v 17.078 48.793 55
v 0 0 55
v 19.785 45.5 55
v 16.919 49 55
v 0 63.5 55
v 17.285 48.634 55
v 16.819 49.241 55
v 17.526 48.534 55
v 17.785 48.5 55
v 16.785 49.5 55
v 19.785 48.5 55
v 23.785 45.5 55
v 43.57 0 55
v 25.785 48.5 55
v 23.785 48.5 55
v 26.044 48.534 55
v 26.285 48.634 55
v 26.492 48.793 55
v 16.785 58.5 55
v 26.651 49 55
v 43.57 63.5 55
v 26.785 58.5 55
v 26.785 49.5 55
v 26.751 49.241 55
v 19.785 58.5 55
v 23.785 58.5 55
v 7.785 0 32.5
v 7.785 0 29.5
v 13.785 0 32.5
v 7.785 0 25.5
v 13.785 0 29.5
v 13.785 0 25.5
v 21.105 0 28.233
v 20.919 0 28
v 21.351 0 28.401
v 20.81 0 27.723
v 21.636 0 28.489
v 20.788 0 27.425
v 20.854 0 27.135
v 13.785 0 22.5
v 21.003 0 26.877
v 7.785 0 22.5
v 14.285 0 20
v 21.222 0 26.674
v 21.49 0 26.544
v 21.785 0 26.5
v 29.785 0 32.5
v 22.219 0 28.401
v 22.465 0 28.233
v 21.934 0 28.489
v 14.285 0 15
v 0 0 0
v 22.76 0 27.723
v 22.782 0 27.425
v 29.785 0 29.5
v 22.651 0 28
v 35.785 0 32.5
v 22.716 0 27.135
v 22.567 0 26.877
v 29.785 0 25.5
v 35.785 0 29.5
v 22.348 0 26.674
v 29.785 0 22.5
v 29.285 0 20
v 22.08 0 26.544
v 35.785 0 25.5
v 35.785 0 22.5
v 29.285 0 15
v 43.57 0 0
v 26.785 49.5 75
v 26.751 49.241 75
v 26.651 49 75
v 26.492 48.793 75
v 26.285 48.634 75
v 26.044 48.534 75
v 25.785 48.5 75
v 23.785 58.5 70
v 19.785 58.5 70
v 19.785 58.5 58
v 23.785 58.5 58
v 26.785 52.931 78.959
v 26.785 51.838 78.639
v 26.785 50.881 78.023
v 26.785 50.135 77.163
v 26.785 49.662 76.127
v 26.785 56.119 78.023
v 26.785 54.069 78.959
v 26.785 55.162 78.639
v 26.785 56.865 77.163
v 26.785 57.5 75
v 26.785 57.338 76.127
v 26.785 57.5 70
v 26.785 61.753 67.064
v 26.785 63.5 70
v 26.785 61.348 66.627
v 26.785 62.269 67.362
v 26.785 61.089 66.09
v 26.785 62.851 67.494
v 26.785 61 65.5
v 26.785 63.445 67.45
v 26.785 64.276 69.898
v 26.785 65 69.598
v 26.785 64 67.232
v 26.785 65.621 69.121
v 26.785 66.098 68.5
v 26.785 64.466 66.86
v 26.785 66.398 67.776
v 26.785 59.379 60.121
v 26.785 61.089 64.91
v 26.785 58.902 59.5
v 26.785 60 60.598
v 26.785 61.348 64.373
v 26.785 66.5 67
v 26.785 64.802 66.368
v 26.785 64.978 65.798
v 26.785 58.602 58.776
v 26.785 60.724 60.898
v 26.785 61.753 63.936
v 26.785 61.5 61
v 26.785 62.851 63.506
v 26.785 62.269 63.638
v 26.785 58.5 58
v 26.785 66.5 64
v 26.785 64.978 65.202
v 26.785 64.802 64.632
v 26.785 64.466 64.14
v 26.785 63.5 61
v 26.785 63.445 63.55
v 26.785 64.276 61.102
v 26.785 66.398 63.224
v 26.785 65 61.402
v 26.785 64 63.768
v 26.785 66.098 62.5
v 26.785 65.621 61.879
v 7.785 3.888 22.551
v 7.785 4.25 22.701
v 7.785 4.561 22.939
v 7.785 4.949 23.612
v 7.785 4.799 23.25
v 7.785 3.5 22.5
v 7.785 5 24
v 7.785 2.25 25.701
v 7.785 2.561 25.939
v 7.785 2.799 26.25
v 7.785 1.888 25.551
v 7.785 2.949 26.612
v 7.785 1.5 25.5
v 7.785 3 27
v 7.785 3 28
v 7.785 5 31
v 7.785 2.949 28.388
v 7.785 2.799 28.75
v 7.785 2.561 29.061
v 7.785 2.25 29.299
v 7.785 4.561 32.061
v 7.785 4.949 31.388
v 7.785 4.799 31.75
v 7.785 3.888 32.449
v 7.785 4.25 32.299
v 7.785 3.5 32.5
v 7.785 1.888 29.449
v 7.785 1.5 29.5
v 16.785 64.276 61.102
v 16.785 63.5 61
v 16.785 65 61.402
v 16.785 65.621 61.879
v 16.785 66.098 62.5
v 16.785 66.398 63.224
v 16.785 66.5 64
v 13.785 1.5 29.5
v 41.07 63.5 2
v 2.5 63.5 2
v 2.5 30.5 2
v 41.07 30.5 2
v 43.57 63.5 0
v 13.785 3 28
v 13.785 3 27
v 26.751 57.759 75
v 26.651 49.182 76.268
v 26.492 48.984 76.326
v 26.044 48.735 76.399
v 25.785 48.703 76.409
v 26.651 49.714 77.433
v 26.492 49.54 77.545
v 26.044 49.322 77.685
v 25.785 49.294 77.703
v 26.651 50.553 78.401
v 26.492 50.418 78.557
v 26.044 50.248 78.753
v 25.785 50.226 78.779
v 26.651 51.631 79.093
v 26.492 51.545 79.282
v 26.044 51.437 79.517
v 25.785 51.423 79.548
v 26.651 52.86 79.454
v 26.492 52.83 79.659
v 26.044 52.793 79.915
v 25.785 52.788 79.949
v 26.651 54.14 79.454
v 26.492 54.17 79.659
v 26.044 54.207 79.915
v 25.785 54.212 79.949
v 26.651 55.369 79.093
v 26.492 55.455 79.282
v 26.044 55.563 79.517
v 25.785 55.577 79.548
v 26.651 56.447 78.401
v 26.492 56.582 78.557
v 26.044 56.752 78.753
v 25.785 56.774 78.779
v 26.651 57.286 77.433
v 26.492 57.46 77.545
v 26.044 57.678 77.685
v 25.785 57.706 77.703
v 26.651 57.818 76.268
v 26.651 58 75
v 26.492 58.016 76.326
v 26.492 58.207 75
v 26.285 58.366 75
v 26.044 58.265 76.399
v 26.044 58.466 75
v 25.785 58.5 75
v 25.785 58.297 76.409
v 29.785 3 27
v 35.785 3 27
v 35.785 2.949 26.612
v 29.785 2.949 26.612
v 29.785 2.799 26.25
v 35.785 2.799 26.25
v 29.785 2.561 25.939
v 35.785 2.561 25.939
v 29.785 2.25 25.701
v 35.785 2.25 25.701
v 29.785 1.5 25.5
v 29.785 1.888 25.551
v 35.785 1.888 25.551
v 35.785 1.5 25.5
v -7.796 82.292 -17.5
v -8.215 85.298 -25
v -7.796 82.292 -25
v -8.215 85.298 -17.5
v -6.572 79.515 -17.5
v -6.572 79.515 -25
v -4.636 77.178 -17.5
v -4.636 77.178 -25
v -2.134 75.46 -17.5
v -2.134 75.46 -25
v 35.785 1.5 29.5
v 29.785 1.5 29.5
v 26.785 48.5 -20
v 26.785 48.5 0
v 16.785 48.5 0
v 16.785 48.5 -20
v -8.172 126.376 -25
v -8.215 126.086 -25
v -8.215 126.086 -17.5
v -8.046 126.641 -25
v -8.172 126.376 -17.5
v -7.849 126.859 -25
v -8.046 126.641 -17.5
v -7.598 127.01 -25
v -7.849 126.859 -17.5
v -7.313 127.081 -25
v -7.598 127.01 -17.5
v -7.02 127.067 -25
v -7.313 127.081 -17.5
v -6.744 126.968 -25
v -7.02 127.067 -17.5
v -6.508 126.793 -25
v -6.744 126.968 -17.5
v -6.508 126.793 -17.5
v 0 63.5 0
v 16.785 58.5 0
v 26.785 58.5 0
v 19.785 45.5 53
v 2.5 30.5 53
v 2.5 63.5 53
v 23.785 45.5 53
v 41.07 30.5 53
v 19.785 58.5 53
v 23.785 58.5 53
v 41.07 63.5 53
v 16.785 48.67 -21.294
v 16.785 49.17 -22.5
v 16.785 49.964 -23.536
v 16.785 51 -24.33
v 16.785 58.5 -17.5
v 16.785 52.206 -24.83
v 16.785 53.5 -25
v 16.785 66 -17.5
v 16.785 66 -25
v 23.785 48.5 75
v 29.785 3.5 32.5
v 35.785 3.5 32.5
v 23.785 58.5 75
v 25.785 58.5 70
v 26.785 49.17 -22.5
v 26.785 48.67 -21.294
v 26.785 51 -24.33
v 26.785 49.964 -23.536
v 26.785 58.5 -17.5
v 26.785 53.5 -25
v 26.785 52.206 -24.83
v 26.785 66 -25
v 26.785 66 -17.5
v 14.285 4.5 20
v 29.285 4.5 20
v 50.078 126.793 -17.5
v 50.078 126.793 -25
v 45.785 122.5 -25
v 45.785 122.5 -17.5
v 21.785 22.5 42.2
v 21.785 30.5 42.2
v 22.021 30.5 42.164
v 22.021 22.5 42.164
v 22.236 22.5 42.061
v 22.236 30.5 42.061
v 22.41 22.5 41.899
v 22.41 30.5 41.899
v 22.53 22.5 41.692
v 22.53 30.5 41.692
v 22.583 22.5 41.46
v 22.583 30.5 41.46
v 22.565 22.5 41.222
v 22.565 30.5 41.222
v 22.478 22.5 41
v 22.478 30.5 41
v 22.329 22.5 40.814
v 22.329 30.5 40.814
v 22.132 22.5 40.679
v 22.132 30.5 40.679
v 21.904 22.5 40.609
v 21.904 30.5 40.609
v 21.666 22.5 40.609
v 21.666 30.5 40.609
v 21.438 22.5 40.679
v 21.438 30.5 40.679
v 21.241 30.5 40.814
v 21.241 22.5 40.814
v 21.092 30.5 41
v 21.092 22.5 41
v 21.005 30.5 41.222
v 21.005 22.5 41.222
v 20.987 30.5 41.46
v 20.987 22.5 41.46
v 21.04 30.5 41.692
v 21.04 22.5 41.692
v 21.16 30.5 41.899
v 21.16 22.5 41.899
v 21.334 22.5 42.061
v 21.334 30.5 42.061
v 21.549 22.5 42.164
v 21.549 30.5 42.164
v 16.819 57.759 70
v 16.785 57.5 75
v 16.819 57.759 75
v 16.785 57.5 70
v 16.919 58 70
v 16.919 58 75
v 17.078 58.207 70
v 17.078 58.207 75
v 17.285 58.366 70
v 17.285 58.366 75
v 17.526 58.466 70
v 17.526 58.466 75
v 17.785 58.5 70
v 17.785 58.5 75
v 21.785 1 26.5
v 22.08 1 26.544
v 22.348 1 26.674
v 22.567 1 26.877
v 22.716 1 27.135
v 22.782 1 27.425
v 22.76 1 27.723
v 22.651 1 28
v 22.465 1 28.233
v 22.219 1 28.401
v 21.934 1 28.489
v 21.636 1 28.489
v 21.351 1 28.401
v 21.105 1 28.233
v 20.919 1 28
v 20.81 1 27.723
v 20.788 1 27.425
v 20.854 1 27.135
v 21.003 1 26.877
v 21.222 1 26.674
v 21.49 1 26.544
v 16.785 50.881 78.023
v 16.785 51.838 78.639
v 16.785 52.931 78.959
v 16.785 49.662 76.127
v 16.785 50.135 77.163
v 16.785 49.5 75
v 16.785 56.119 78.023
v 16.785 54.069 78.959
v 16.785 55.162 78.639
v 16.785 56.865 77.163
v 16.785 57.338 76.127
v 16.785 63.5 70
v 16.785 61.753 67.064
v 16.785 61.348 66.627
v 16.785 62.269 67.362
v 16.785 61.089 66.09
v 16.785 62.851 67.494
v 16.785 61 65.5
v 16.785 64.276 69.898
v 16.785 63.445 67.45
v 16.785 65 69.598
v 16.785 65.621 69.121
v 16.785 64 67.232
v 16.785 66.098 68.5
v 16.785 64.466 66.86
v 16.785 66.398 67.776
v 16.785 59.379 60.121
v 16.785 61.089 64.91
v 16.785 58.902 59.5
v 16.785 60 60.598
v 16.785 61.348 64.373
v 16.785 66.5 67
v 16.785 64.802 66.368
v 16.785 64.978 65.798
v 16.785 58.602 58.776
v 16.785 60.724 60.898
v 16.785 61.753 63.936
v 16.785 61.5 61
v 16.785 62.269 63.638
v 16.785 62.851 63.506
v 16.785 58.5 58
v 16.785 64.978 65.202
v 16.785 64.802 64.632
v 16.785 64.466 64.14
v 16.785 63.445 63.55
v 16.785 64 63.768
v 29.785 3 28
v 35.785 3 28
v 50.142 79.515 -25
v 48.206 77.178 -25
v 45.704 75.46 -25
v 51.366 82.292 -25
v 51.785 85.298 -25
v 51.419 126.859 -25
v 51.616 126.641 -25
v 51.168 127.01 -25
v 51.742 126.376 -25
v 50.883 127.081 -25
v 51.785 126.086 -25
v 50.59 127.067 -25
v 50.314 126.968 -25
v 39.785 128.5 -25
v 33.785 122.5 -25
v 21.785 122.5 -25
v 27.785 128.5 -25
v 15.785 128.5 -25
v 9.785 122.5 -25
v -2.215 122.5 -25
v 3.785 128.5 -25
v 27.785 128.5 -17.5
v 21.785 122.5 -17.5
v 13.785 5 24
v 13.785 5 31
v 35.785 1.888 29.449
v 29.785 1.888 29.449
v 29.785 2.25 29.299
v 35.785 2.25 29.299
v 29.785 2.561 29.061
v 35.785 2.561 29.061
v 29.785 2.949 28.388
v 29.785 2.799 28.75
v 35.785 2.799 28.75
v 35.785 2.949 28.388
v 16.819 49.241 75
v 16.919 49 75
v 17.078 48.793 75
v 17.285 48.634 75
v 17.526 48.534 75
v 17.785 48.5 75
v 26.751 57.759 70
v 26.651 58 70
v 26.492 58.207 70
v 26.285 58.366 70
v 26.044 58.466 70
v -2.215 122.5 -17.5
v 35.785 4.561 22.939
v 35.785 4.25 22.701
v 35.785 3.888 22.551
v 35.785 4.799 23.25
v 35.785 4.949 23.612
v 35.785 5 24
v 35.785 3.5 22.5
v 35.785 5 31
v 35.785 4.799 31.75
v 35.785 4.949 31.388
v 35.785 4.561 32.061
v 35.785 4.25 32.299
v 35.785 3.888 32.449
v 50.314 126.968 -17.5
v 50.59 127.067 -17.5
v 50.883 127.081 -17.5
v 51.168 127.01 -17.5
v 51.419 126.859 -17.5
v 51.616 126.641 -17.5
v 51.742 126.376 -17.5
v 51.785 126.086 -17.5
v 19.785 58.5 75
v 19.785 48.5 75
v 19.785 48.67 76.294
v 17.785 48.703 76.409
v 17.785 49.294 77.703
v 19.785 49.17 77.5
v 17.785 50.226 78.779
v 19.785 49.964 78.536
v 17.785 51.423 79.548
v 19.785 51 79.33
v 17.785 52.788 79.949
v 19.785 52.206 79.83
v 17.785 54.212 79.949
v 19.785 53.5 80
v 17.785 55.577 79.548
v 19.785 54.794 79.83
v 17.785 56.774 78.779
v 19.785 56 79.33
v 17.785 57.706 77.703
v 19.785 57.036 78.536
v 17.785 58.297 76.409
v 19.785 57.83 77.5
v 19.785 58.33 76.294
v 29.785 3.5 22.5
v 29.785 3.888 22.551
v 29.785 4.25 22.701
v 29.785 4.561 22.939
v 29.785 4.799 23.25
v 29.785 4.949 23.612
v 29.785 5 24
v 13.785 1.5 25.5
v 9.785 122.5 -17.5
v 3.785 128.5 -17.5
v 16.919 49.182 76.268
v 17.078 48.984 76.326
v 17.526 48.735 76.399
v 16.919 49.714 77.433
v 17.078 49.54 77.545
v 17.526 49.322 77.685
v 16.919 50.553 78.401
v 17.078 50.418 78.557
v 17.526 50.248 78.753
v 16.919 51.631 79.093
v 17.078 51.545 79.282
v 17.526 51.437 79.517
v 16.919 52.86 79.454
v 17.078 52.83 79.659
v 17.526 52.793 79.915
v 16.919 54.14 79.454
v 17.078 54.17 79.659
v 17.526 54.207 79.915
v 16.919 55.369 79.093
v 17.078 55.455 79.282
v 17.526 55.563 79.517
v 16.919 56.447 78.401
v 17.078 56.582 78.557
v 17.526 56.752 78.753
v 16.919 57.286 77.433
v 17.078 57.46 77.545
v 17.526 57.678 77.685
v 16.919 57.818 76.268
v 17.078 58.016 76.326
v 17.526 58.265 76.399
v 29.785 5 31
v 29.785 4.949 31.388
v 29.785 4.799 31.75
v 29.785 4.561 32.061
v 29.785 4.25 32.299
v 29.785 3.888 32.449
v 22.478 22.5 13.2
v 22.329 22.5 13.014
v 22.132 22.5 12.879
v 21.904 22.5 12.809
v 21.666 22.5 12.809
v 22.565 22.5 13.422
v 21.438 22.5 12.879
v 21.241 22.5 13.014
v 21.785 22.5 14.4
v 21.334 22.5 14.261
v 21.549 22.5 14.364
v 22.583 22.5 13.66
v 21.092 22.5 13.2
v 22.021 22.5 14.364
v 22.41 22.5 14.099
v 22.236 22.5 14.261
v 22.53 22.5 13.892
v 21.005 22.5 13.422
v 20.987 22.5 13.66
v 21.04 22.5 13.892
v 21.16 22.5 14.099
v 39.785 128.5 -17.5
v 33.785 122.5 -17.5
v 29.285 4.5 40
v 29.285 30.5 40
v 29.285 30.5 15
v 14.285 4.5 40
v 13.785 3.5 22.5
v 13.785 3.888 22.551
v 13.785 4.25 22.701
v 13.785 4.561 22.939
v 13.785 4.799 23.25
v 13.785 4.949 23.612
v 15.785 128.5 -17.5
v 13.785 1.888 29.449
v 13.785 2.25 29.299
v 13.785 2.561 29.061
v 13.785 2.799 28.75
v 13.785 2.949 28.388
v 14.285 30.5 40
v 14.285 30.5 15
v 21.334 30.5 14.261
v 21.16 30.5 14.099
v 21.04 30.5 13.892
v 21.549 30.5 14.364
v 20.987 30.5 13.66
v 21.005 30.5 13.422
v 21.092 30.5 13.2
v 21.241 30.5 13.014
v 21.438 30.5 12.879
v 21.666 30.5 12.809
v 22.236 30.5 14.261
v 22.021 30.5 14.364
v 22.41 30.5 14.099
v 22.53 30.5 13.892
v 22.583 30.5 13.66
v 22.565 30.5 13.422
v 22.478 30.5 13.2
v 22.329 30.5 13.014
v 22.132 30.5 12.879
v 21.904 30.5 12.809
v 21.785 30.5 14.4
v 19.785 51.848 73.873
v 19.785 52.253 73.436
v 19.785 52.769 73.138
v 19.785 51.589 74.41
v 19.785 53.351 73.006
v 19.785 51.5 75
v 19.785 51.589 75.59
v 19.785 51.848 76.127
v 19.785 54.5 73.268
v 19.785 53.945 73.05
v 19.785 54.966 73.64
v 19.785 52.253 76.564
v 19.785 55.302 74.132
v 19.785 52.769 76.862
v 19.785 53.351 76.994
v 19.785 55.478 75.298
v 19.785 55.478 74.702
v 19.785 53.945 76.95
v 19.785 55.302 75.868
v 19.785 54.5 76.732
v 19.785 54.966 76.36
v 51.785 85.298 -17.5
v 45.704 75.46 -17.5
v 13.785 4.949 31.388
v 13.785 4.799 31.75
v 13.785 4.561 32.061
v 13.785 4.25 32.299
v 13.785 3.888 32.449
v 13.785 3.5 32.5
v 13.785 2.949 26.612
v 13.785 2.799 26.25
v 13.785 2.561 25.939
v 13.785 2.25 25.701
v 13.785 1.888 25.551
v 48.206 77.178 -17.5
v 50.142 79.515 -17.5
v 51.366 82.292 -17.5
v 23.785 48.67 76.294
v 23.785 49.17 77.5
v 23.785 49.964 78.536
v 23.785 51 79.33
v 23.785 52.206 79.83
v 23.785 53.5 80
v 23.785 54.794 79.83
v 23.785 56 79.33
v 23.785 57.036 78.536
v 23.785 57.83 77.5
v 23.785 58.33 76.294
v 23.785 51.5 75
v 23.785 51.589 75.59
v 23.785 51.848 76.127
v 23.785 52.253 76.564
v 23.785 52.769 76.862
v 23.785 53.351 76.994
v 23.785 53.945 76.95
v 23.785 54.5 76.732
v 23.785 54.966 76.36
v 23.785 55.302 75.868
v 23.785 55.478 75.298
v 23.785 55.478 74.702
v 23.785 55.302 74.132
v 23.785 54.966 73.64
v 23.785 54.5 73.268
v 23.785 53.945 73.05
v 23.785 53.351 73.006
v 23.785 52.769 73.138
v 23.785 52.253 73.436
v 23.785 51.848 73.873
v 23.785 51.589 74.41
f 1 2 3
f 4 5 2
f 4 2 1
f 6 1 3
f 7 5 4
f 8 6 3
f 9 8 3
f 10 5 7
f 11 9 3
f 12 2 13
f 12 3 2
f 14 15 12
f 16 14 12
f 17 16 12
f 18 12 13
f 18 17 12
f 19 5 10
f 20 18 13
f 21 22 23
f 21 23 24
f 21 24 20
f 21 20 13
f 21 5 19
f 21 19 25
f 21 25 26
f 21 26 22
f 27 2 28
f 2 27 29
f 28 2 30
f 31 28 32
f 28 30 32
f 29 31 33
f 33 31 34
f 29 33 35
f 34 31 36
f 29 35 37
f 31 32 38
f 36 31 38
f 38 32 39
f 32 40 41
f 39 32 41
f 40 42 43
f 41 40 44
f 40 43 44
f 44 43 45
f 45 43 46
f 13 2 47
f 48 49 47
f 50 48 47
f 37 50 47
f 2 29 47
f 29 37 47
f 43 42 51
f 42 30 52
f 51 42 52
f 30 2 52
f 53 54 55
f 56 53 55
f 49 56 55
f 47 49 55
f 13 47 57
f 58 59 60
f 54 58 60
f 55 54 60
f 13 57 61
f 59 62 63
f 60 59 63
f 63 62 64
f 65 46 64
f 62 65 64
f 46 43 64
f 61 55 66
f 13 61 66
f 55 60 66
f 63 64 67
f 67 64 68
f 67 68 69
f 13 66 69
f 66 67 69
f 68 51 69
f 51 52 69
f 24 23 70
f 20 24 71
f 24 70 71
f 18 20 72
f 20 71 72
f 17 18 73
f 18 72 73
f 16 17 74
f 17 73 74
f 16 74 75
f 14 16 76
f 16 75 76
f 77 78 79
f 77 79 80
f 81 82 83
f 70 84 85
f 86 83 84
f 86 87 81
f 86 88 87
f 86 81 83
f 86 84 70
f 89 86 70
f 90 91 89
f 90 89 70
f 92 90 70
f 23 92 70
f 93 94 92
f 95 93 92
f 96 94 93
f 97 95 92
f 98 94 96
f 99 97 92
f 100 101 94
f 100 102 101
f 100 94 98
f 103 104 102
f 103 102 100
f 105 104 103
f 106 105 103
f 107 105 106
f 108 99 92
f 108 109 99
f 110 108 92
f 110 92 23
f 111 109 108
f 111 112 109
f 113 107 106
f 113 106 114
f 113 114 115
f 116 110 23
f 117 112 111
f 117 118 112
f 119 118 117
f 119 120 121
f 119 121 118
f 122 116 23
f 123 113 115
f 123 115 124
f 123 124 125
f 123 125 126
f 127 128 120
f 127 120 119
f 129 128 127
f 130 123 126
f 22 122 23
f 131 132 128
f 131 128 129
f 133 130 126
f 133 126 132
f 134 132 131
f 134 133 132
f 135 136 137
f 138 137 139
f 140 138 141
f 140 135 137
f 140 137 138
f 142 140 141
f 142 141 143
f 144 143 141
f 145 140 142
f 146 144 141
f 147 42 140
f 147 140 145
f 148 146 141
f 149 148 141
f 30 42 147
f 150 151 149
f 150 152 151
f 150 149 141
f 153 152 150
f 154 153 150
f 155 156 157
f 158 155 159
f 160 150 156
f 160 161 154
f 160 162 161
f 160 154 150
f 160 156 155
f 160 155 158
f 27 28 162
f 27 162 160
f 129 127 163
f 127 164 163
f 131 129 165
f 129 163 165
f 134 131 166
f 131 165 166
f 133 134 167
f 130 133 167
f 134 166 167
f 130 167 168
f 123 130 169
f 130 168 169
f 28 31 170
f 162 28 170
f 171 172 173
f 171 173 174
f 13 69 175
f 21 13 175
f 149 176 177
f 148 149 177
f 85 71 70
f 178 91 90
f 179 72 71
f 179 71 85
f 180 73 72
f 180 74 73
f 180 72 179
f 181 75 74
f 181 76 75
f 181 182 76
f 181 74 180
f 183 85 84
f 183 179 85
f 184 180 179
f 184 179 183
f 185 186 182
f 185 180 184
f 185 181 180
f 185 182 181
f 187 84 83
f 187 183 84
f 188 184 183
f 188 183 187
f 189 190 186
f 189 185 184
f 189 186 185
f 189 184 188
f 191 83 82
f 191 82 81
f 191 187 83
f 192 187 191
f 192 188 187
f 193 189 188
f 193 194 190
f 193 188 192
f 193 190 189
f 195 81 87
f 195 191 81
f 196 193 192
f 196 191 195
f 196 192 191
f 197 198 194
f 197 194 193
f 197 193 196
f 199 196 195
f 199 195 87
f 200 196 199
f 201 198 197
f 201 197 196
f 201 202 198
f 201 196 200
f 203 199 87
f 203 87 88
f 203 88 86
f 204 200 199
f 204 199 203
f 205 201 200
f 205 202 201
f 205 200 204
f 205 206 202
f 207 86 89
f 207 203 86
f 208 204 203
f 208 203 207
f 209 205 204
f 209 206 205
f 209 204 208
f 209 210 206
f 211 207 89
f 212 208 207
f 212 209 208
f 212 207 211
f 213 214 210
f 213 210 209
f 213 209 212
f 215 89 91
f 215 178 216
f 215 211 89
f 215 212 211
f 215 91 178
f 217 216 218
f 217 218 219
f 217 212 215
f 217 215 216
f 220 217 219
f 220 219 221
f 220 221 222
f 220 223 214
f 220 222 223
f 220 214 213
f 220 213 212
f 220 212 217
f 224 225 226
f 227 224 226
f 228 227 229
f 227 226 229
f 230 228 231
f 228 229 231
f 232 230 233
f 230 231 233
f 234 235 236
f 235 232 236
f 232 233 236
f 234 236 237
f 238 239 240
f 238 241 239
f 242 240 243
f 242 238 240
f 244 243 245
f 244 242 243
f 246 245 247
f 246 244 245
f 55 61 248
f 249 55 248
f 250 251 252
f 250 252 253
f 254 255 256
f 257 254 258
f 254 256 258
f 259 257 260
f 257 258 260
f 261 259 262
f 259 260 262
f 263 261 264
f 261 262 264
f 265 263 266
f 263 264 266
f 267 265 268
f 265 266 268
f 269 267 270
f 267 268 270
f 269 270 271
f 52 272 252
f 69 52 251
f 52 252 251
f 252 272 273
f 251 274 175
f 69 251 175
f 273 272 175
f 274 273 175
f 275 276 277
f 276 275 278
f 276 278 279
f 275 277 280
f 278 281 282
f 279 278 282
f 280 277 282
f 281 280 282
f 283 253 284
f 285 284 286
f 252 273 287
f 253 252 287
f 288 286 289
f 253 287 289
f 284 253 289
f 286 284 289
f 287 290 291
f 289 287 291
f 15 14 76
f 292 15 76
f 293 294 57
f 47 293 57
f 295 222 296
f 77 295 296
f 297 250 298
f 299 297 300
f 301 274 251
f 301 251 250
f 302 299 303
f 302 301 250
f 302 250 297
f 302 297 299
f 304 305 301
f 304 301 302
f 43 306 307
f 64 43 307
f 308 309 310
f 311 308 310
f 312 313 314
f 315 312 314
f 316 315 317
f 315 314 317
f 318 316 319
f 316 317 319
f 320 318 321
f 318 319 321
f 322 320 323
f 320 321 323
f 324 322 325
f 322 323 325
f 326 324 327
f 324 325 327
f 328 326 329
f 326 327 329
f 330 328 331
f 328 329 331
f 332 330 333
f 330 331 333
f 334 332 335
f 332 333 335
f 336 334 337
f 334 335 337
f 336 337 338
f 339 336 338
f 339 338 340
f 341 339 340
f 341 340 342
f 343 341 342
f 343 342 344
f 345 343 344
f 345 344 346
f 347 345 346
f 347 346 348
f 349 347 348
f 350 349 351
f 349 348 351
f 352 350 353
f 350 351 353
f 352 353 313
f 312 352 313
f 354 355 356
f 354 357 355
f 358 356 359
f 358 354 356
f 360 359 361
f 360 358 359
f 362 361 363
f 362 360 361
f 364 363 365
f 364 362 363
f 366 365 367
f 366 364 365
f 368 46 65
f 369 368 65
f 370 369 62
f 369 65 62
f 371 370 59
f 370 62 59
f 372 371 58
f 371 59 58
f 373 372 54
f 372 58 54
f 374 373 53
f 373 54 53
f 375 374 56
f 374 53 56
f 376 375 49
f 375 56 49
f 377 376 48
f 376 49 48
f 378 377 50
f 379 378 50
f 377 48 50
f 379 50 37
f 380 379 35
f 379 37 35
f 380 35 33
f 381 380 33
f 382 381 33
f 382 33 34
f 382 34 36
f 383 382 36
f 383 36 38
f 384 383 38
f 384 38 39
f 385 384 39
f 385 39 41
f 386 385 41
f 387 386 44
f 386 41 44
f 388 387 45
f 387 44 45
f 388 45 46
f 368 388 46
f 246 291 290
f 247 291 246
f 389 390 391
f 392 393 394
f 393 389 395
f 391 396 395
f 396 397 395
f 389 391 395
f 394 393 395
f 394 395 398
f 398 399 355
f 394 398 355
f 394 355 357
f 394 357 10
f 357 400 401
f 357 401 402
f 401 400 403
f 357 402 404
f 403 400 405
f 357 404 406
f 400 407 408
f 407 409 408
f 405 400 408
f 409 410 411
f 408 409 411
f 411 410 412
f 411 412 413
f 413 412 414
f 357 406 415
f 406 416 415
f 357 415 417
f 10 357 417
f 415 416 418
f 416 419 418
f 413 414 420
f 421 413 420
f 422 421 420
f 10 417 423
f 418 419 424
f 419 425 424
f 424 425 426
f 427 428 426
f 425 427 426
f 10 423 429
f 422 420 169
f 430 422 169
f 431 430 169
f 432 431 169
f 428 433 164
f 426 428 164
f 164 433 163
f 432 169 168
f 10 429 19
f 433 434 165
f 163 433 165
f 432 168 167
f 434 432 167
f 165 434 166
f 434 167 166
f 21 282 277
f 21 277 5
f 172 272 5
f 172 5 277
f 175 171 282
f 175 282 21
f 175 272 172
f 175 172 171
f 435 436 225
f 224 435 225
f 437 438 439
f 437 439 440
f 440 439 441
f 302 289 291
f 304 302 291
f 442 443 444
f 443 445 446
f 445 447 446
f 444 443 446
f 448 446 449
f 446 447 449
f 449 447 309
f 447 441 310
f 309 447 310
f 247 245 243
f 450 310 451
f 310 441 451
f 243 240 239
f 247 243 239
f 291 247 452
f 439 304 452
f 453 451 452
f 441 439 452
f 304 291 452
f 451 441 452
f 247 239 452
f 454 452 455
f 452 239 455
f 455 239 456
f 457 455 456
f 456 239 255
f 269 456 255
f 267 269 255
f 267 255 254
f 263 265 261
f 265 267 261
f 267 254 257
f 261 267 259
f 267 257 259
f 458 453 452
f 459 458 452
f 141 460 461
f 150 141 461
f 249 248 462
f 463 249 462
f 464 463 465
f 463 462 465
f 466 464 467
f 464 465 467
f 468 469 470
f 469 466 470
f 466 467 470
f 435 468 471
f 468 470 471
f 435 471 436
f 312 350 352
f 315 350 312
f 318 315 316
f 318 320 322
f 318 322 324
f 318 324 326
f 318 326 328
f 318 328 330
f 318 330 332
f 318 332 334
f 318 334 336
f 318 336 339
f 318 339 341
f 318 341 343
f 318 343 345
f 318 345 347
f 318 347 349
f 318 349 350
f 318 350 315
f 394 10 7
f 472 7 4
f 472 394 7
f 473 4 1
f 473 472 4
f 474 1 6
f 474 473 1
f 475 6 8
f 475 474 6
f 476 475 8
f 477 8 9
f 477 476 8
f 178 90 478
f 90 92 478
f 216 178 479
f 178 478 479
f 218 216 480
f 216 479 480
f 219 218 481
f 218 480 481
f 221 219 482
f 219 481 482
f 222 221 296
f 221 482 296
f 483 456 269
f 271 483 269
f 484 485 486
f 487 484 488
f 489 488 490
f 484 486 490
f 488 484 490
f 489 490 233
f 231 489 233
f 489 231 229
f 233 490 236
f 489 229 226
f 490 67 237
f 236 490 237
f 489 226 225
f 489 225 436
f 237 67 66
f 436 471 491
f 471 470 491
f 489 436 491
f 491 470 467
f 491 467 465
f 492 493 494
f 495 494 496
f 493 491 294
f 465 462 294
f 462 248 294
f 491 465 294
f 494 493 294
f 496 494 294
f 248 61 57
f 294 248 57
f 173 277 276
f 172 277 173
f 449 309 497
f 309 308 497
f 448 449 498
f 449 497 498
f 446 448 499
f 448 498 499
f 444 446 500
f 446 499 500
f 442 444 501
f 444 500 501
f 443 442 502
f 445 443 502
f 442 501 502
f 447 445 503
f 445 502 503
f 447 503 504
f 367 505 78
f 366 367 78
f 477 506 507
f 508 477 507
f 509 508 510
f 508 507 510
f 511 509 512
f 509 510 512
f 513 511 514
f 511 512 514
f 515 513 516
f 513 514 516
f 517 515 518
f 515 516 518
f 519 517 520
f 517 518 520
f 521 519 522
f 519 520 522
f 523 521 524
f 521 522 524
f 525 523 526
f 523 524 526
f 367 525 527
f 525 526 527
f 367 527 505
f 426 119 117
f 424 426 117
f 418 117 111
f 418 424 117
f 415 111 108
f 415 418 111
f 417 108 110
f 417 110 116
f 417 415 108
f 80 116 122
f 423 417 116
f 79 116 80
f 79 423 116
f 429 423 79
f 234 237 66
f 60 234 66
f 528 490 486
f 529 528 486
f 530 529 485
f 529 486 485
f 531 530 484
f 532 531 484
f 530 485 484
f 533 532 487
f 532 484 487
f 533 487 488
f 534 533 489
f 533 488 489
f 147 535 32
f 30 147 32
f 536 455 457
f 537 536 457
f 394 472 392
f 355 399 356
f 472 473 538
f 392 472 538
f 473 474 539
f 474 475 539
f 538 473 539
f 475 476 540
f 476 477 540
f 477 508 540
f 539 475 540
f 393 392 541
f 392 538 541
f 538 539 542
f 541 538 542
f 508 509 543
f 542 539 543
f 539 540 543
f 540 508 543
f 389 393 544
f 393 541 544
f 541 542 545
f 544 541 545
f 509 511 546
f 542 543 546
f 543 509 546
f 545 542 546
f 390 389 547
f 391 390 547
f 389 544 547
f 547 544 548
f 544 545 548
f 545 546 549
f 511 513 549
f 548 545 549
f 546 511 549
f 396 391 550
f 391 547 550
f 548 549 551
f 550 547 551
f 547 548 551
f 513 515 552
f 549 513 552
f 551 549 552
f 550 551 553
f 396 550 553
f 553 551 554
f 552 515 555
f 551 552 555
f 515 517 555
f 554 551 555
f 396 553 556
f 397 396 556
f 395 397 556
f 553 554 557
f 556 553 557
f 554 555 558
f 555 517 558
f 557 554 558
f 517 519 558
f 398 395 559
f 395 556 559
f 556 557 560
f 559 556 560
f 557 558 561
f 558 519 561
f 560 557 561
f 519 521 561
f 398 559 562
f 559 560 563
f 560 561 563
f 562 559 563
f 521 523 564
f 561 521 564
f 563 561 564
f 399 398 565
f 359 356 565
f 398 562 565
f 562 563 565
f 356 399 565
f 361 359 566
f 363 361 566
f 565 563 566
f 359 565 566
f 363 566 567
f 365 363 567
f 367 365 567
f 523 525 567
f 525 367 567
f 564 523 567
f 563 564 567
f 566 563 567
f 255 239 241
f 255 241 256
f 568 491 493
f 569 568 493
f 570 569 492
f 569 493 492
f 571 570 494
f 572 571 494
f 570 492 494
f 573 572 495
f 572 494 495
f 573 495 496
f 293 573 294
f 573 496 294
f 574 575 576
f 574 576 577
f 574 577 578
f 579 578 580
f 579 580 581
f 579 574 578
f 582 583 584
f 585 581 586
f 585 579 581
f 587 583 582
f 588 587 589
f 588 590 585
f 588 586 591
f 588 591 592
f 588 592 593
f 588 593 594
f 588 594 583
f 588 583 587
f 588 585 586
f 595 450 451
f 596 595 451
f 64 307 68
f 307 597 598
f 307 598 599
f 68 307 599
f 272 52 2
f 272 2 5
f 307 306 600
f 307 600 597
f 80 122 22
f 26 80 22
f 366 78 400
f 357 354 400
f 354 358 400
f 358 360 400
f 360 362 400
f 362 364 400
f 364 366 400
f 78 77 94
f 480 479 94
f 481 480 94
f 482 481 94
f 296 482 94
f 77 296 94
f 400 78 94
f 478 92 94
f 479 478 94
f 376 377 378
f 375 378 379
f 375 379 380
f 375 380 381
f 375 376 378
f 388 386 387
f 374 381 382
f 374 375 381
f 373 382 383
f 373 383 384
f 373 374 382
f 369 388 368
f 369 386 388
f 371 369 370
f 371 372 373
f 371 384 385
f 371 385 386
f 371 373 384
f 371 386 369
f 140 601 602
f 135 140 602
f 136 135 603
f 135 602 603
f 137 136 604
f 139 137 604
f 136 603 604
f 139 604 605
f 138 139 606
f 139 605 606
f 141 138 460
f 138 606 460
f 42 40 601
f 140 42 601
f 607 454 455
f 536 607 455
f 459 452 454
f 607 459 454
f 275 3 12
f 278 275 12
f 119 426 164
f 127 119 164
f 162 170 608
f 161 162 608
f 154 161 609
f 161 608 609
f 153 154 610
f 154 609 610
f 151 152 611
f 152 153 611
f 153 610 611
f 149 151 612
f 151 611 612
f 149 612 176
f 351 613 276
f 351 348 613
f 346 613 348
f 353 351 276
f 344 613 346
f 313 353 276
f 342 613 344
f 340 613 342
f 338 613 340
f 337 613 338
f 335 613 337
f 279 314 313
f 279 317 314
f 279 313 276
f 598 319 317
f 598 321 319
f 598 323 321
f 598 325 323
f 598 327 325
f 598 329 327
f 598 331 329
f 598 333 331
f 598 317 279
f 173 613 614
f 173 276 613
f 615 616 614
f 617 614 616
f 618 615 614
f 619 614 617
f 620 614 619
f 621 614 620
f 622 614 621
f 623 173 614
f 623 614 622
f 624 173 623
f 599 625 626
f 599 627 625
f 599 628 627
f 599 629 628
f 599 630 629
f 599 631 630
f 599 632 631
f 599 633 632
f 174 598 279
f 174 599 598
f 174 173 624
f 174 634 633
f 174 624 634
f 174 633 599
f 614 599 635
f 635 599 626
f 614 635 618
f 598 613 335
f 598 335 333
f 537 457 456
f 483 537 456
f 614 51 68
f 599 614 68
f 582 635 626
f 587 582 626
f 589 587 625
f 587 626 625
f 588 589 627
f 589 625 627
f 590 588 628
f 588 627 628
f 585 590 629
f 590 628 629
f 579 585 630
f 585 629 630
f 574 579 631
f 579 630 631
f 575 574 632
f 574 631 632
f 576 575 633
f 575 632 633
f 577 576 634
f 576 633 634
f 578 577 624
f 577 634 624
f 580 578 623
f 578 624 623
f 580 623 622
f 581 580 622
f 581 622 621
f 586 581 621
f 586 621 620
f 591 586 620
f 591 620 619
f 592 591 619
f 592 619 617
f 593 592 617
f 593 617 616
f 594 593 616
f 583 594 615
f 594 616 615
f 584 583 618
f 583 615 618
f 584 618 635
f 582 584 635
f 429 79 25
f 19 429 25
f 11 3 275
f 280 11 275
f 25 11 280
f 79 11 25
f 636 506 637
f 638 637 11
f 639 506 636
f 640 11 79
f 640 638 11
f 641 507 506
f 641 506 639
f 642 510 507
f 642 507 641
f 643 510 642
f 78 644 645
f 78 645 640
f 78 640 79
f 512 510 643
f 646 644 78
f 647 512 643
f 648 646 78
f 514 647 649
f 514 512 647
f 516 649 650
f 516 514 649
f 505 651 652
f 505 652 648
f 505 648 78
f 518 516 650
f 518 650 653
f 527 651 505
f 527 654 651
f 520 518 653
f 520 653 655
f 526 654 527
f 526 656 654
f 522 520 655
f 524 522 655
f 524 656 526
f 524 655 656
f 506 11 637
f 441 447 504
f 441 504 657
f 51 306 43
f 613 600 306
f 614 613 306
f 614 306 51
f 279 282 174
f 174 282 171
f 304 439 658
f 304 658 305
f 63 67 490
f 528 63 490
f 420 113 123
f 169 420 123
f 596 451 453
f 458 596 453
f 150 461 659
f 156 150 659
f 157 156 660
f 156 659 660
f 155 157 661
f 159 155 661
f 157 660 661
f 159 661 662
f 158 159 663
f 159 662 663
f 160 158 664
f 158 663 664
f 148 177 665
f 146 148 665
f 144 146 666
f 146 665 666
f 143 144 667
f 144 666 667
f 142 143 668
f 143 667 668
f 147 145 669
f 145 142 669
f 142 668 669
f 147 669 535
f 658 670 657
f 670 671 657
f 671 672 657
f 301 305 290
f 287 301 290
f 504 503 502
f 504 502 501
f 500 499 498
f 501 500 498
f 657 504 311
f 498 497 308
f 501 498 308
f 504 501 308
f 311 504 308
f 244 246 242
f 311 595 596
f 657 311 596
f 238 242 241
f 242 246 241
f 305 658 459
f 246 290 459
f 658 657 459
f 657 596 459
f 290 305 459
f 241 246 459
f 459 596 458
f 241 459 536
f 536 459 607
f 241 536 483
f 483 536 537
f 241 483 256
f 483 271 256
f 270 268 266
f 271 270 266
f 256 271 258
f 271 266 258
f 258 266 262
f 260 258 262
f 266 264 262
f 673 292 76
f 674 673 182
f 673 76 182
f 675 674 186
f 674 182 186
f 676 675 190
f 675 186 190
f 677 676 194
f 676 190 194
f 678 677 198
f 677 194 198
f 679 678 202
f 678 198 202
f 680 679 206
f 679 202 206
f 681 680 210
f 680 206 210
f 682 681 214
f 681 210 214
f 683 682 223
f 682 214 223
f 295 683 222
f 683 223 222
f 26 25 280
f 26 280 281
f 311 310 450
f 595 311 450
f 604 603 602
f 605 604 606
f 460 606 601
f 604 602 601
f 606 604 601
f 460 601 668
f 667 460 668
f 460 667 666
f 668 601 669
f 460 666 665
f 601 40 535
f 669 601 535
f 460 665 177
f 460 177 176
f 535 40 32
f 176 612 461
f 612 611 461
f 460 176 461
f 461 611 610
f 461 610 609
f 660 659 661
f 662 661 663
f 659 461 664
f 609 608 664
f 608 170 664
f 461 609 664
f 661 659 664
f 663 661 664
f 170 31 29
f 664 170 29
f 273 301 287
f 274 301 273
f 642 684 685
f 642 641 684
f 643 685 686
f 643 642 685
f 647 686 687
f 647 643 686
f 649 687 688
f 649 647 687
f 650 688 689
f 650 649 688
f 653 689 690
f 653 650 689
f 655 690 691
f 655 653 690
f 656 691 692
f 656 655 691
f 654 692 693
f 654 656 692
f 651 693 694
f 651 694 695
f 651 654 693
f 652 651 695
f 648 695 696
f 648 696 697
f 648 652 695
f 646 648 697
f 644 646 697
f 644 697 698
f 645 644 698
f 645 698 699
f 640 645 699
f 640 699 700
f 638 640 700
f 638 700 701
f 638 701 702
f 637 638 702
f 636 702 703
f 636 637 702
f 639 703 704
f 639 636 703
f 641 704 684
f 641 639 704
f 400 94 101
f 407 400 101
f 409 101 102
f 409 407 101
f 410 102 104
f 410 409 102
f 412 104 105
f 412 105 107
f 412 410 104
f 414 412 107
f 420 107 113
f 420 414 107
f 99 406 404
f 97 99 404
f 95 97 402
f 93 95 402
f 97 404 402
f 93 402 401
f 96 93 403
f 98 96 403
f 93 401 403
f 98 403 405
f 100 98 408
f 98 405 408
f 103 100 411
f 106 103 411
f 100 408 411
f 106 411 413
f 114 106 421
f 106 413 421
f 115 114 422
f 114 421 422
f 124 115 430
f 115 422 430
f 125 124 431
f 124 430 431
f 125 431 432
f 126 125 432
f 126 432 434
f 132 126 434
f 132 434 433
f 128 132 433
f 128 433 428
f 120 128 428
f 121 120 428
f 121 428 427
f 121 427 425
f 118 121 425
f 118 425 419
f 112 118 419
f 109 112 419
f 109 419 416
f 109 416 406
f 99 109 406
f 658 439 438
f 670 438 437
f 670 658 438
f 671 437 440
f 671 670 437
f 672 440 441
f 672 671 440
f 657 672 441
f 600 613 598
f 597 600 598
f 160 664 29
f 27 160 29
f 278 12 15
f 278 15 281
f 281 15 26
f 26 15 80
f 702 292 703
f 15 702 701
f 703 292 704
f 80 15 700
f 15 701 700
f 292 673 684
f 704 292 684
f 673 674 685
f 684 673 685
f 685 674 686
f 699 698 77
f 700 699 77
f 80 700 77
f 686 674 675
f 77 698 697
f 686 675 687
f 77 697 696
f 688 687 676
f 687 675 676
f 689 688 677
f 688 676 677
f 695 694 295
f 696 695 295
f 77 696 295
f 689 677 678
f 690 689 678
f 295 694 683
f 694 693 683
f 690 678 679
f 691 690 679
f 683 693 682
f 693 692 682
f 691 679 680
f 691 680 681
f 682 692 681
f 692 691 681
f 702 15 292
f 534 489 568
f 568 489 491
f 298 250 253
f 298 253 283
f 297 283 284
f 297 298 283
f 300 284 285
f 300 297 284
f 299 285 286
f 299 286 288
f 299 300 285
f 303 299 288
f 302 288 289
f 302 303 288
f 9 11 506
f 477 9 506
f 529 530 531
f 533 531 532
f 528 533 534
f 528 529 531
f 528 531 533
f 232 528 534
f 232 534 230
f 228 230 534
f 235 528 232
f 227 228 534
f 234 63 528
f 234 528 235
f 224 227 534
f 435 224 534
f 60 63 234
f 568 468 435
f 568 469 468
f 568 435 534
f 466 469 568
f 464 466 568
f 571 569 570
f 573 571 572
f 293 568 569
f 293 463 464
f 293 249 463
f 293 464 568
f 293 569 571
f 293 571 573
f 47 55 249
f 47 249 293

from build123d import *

# Parameters (mm, degrees)
SKETCH1_W           = 43.57
SKETCH1_H           = 63.5
BOSS_EXTRUDE1_DEPTH = 55
CUT_EXTRUDE2_DEPTH  = 95.634004988
SKETCH4_W           = 43.57
SKETCH4_H           = 55
SKETCH4_W_2         = 6
SKETCH4_H_2         = 15
BOSS_EXTRUDE2_DEPTH = 9
SKETCH5_R           = 1
CUT_EXTRUDE3_DEPTH  = 1
BOSS_EXTRUDE3_START = -26.785
BOSS_EXTRUDE3_DEPTH = 10
SKETCH7_R           = 2
CUT_EXTRUDE4_DEPTH  = 2
SKETCH13_W          = 9
SKETCH13_H          = 8
BOSS_EXTRUDE6_DEPTH = 10
FILLET12_R          = 3
FILLET2_R           = 1
BOSS_EXTRUDE4_DEPTH = 10
BOSS_EXTRUDE5_DEPTH = 7.5
CUT_EXTRUDE11_DEPTH = 174.835946297
LPATTERN1_COUNT     = 5
LPATTERN1_PITCH     = 12
FILLET9_R           = 1
FILLET11_R          = 11
SKETCH14_R          = 2
CUT_EXTRUDE12_DEPTH = 156.361674811
SKETCH15_W          = 15
SKETCH15_H          = 33
CUT_EXTRUDE13_DEPTH = 33
SKETCH16_W          = 15
SKETCH16_H          = 25
CUT_EXTRUDE14_DEPTH = 26
SKETCH18_R          = 0.8
CUT_EXTRUDE15_DEPTH = 8
SKETCH19_W          = 15
SKETCH19_H          = 5
CUT_EXTRUDE16_DEPTH = 25
SKETCH20_W          = 38.57
SKETCH20_H          = 51
CUT_EXTRUDE17_DEPTH = 33
SKETCH21_W          = 4
SKETCH21_H          = 13
CUT_EXTRUDE18_DEPTH = 27


with BuildPart() as part:
    # Sketch1 → Boss-Extrude1 (new body)
    with BuildSketch(Plane.XY):
        with Locations((21.785, 31.75)):
            Rectangle(SKETCH1_W, SKETCH1_H)
    extrude(amount=BOSS_EXTRUDE1_DEPTH)

    # Sketch3 → Cut-Extrude2 (cut, through all)
    with BuildSketch(Plane(origin=(43.57, 0, 0), x_dir=(0, 0, -1), z_dir=(1, 0, 0))):
        with BuildLine():
            Line((-29.5, 0), (-29.5, 1.5))
            ThreePointArc((-29.5, 1.5), (-29.060660172, 2.560660172), (-28, 3))
            Line((-28, 3), (-27, 3))
            ThreePointArc((-27, 3), (-25.939339828, 2.560660172), (-25.5, 1.5))
            Line((-25.5, 1.5), (-25.5, 0))
            Line((-25.5, 0), (-22.5, 0))
            Line((-22.5, 0), (-22.5, 3.5))
            ThreePointArc((-22.5, 3.5), (-22.939339828, 4.560660172), (-24, 5))
            Line((-24, 5), (-31, 5))
            ThreePointArc((-31, 5), (-32.060660172, 4.560660172), (-32.5, 3.5))
            Line((-32.5, 3.5), (-32.5, 0))
            Line((-32.5, 0), (-29.5, 0))
        make_face()
    extrude(amount=-CUT_EXTRUDE2_DEPTH, mode=Mode.SUBTRACT)


with BuildPart() as cut_extrude2_piece_1:
    # of the separate pieces the step leaves, piece 1, a body of its own (cut_extrude2_pieces)
    add(part.part.solids().sort_by_distance((0, 0, 0))[0])



with BuildPart() as cut_extrude2_piece_2:
    # of the separate pieces the step leaves, piece 2, a body of its own (cut_extrude2_pieces)
    add(part.part.solids().sort_by_distance((43.57, 0, 25.5))[0])


with BuildPart() as cut_extrude2_piece_1_1:
    add(cut_extrude2_piece_1.part)

    add(cut_extrude2_piece_2.part)  # Boss-Extrude2 merges Cut-Extrude2 piece 2
    # Sketch4 → Boss-Extrude2 (add)
    with BuildSketch(Plane.XZ):
        with Locations((21.785, 27.5)):
            Rectangle(SKETCH4_W, SKETCH4_H)
        with Locations((10.785, 27.5)):
            Rectangle(SKETCH4_W_2, SKETCH4_H_2, mode=Mode.SUBTRACT)
        with Locations((32.785, 27.5)):
            Rectangle(SKETCH4_W_2, SKETCH4_H_2, mode=Mode.SUBTRACT)
    extrude(amount=-BOSS_EXTRUDE2_DEPTH)

    # Sketch5 → Cut-Extrude3 (cut)
    with BuildSketch(Plane(origin=(0, 0, 0), x_dir=(-1, 0, 0), z_dir=(0, -1, 0))):
        with Locations(Location((-21.785, -27.5, 0), (0, 0, 90))):
            Circle(SKETCH5_R)
    extrude(amount=-CUT_EXTRUDE3_DEPTH, mode=Mode.SUBTRACT)

    # Sketch6 → Boss-Extrude3 (add)
    with BuildSketch(Plane.ZY.offset(BOSS_EXTRUDE3_START)):
        with BuildLine():
            Line((55, 48.5), (75, 48.5))
            ThreePointArc((75, 48.5), (80, 53.5), (75, 58.5))
            Line((75, 58.5), (55, 58.5))
            ThreePointArc((55, 58.5), (50, 53.5), (55, 48.5))
        make_face()
    boss_extrude3 = extrude(amount=BOSS_EXTRUDE3_DEPTH)

    # Mirror1: Boss-Extrude3 across plane
    add(boss_extrude3.mirror(Plane(origin=(0, 0, 27.5), x_dir=(1, 0, 0), z_dir=(0, 0, -1))))

    # Sketch7 → Cut-Extrude4 (cut, symmetric)
    # profile 1 of 3: a face of its own
    with BuildSketch(Plane.ZY.offset(-21.785)):
        with BuildLine():
            ThreePointArc((75, 58.5), (71.464466094, 57.035533906), (70, 53.5))
            ThreePointArc((70, 53.5), (71.464466094, 49.964466094), (75, 48.5))
            ThreePointArc((75, 48.5), (78.535533906, 49.964466094), (80, 53.5))
            ThreePointArc((80, 53.5), (78.535533906, 57.035533906), (75, 58.5))
        make_face()
        with Locations(Location((75, 53.5, 0), (0, 0, 270))):
            Circle(SKETCH7_R, mode=Mode.SUBTRACT)
    # profile 2 of 3: a face of its own
    with BuildSketch(Plane.ZY.offset(-21.785)):
        with BuildLine():
            Line((70, 58.5), (70, 53.5))
            ThreePointArc((70, 53.5), (71.464466094, 57.035533906), (75, 58.5))
            Line((75, 58.5), (70, 58.5))
        make_face()
    # profile 3 of 3: a face of its own
    with BuildSketch(Plane.ZY.offset(-21.785)):
        with BuildLine():
            ThreePointArc((75, 48.5), (71.464466094, 49.964466094), (70, 53.5))
            Line((70, 53.5), (70, 48.5))
            Line((70, 48.5), (75, 48.5))
        make_face()
    extrude(amount=CUT_EXTRUDE4_DEPTH, both=True, mode=Mode.SUBTRACT)

    # Sketch13 → Boss-Extrude6 (add)
    with BuildSketch(Plane(origin=(26.785, 0, 0), x_dir=(0, 0, -1), z_dir=(1, 0, 0))):
        with Locations((-65.5, 62.5)):
            Rectangle(SKETCH13_W, SKETCH13_H)
    extrude(amount=-BOSS_EXTRUDE6_DEPTH)

    # Fillet12
    fillet12_edges = [cut_extrude2_piece_1_1.edges().sort_by_distance(p)[0] for p in [
        (21.785, 66.5, 61),
        (21.785, 66.5, 70),
        (21.785, 58.5, 61),
    ]]
    fillet(fillet12_edges, radius=FILLET12_R)

    # Fillet2
    fillet2_edges = [cut_extrude2_piece_1_1.edges().sort_by_distance(p)[0] for p in [
        (16.785, 48.5, 65),
        (16.785, 53.5, 80),
        (16.785, 58.5, 72.5),
        (26.785, 48.5, 65),
        (26.785, 53.5, 80),
        (26.785, 58.5, 72.5),
    ]]
    fillet(fillet2_edges, radius=FILLET2_R)

    # Sketch10 → Boss-Extrude4 (add)
    with BuildSketch(Plane.ZY.offset(-16.785)):
        with BuildLine():
            Line((-25, 53.5), (-25, 78.5))
            Line((-25, 78.5), (-17.5, 78.5))
            Line((-17.5, 78.5), (-17.5, 58.5))
            Line((-17.5, 58.5), (-20, 58.5))
            ThreePointArc((-20, 58.5), (-23.535533906, 57.035533906), (-25, 53.5))
        make_face()
    extrude(amount=-BOSS_EXTRUDE4_DEPTH)

    # Sketch11 → Boss-Extrude5 (add)
    with BuildSketch(Plane(origin=(0, 0, -25), x_dir=(-1, 0, 0), z_dir=(0, 0, -1))):
        Polygon((-21.785, 63.5), (8.215, 78.5), (8.215, 128.5), (-51.785, 128.5), (-51.785, 78.5), align=None)
    extrude(amount=-BOSS_EXTRUDE5_DEPTH)

    # Sketch12 → Cut-Extrude11 (cut, through all)
    with BuildSketch(Plane(origin=(0, 0, -25), x_dir=(-1, 0, 0), z_dir=(0, 0, -1))):
        Polygon((-51.785, 128.5), (-45.785, 122.5), (-39.785, 128.5), align=None)
    cut_extrude11 = extrude(amount=-CUT_EXTRUDE11_DEPTH, mode=Mode.SUBTRACT)

    # LPattern1: Cut-Extrude11 ×5
    with Locations(*[(-i * LPATTERN1_PITCH, 0, 0) for i in range(1, LPATTERN1_COUNT)]):
        add(cut_extrude11, mode=Mode.SUBTRACT)

    # Fillet9
    fillet9_edges = [cut_extrude2_piece_1_1.edges().sort_by_distance(p)[0] for p in [
        (-8.215, 128.5, -21.25),
        (51.785, 128.5, -21.25),
    ]]
    fillet(fillet9_edges, radius=FILLET9_R)

    # Fillet11
    fillet11_edges = [cut_extrude2_piece_1_1.edges().sort_by_distance(p)[0] for p in [
        (-8.215, 78.5, -21.25),
        (51.785, 78.5, -21.25),
    ]]
    fillet(fillet11_edges, radius=FILLET11_R)

    # Sketch14 → Cut-Extrude12 (cut, through all)
    with BuildSketch(Plane.ZY.offset(-16.785)):
        with Locations(Location((65.5, 63, 0), (0, 0, 270))):
            Circle(SKETCH14_R)
    extrude(amount=-CUT_EXTRUDE12_DEPTH, mode=Mode.SUBTRACT)

    # Sketch15 → Cut-Extrude13 (cut)
    with BuildSketch(Plane(origin=(0, 63.5, 0), x_dir=(1, 0, 0), z_dir=(0, 1, 0))):
        with Locations((21.785, -27.5)):
            Rectangle(SKETCH15_W, SKETCH15_H)
    extrude(amount=-CUT_EXTRUDE13_DEPTH, mode=Mode.SUBTRACT)

    # Sketch16 → Cut-Extrude14 (cut)
    with BuildSketch(Plane(origin=(0, 30.5, 0), x_dir=(1, 0, 0), z_dir=(0, 1, 0))):
        with Locations((21.785, -27.5)):
            Rectangle(SKETCH16_W, SKETCH16_H)
    extrude(amount=-CUT_EXTRUDE14_DEPTH, mode=Mode.SUBTRACT)

    # Sketch18 → Cut-Extrude15 (cut)
    with BuildSketch(Plane(origin=(0, 30.5, 0), x_dir=(1, 0, 0), z_dir=(0, 1, 0))):
        with Locations(Location((21.785, -13.6, 0), (0, 0, 270))):
            Circle(SKETCH18_R)
        with Locations(Location((21.785, -41.4, 0), (0, 0, 270))):
            Circle(SKETCH18_R)
    extrude(amount=-CUT_EXTRUDE15_DEPTH, mode=Mode.SUBTRACT)

    # Sketch19 → Cut-Extrude16 (cut)
    with BuildSketch(Plane(origin=(0, 4.5, 0), x_dir=(1, 0, 0), z_dir=(0, 1, 0))):
        with Locations((21.785, -17.5)):
            Rectangle(SKETCH19_W, SKETCH19_H)
    extrude(amount=-CUT_EXTRUDE16_DEPTH, mode=Mode.SUBTRACT)

    # Sketch20 → Cut-Extrude17 (cut)
    with BuildSketch(Plane(origin=(0, 63.5, 0), x_dir=(1, 0, 0), z_dir=(0, 1, 0))):
        with Locations((21.785, -27.5)):
            Rectangle(SKETCH20_W, SKETCH20_H)
    extrude(amount=-CUT_EXTRUDE17_DEPTH, mode=Mode.SUBTRACT)

    # Sketch21 → Cut-Extrude18 (cut)
    with BuildSketch(Plane.XY.offset(70)):
        with Locations((21.785, 52)):
            Rectangle(SKETCH21_W, SKETCH21_H)
    extrude(amount=-CUT_EXTRUDE18_DEPTH, mode=Mode.SUBTRACT)


solid = cut_extrude2_piece_1_1.part
